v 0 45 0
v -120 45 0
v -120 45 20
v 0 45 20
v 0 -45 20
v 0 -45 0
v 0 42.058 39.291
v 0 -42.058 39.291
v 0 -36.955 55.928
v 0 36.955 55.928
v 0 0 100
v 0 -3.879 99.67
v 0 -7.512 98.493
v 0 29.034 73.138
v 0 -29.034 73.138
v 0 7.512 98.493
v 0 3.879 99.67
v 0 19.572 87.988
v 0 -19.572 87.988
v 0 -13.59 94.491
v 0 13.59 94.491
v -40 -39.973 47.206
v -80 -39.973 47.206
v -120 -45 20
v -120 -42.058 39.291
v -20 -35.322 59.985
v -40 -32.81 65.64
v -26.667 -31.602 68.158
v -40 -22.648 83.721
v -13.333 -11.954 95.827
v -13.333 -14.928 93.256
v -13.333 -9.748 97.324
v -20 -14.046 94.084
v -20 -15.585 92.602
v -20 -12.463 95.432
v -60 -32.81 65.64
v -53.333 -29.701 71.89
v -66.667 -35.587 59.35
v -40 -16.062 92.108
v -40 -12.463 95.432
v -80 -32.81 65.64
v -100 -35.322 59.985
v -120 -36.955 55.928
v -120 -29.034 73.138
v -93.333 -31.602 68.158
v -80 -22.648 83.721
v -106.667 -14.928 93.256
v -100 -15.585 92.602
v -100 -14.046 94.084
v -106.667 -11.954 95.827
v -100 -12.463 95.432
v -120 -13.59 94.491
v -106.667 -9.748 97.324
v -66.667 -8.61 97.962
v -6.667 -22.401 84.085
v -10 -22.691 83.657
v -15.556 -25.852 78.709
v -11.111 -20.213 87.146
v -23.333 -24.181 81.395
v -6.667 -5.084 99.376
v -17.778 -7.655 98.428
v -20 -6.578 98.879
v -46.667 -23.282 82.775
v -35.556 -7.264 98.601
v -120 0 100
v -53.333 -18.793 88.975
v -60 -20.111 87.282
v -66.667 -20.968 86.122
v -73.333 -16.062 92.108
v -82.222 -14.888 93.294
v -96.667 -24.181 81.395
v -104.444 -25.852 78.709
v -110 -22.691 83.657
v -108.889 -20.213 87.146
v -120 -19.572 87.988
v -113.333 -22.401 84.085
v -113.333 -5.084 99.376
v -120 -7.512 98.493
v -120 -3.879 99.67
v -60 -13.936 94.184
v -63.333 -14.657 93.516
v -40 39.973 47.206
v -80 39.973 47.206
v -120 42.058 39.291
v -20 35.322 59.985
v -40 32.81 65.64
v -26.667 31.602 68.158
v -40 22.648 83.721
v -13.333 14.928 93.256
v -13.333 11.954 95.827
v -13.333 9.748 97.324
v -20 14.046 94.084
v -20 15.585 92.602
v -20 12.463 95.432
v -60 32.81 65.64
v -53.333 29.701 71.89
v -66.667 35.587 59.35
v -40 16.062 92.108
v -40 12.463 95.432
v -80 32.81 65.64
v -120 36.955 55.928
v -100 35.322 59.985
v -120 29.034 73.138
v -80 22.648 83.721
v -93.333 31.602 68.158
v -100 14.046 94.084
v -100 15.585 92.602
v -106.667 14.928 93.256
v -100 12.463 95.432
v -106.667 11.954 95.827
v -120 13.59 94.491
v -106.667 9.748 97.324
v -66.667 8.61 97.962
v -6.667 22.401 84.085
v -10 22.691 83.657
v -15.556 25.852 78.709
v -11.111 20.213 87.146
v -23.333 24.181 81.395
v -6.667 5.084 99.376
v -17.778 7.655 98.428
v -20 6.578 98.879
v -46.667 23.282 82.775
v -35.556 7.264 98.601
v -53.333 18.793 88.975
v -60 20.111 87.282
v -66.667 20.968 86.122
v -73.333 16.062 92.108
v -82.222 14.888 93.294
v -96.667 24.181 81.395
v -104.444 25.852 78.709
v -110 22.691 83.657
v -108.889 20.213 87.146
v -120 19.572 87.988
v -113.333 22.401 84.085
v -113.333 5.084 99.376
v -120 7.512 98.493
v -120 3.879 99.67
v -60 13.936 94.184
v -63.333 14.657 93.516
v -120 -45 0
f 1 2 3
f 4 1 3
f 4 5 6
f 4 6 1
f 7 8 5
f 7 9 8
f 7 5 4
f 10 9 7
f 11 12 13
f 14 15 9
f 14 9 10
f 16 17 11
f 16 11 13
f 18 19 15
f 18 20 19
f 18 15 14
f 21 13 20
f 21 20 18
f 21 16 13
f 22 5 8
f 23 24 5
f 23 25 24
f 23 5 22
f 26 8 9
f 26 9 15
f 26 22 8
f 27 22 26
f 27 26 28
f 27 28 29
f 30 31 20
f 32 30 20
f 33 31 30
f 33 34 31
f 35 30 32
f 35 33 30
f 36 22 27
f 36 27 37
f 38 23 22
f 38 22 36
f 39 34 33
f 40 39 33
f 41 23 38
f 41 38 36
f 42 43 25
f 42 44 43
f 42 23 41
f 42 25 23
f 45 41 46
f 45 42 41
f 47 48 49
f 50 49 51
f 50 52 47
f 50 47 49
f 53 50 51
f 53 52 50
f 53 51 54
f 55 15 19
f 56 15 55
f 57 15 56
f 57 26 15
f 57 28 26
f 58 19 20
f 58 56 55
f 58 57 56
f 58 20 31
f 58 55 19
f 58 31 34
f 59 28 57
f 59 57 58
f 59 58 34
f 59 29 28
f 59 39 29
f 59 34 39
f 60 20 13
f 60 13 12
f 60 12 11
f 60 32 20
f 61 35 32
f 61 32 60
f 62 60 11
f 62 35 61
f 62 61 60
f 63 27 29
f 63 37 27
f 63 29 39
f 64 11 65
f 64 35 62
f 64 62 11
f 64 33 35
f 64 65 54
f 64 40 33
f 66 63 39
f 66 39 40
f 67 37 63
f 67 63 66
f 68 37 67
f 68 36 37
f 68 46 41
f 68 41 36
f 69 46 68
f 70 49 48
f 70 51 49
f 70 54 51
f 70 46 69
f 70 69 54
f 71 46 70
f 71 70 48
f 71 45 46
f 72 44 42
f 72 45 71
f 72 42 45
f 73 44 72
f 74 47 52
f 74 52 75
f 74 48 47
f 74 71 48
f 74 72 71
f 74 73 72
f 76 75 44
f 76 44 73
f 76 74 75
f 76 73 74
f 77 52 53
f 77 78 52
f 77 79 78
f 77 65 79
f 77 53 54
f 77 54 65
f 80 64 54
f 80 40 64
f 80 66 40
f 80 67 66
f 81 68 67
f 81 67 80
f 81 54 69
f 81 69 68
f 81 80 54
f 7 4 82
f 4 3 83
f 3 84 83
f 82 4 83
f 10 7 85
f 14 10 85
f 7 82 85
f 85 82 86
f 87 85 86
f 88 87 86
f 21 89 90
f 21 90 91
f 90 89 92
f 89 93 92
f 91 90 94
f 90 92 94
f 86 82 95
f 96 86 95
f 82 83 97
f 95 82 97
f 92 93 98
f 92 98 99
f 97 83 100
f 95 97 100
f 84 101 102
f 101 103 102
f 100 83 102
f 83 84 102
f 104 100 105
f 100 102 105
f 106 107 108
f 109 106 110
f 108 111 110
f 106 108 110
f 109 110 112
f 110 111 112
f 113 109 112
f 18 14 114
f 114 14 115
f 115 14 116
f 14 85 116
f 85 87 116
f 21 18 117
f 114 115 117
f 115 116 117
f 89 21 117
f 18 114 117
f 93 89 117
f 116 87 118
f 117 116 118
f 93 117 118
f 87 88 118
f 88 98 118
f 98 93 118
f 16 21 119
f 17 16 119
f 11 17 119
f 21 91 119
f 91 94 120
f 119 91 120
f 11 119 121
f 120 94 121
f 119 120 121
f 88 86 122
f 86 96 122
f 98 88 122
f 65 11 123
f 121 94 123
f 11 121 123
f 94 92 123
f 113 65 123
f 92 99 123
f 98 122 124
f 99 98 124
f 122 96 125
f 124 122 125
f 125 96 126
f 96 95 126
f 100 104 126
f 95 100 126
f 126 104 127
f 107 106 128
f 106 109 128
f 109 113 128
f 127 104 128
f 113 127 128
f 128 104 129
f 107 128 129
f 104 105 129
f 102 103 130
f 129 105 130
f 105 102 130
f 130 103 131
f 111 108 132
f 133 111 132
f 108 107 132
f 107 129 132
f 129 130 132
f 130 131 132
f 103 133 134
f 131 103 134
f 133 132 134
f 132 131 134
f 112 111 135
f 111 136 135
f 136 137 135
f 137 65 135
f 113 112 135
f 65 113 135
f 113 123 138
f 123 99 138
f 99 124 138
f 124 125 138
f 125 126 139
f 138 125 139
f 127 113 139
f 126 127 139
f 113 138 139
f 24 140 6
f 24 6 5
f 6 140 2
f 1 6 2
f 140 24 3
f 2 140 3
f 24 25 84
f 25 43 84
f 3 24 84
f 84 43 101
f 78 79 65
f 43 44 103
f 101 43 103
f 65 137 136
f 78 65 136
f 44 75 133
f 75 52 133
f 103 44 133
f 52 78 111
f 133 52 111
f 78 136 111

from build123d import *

# Parameters (mm, degrees)
F2_W     = 90
F2_H     = 20
F3_DEPTH = 120


with BuildPart() as f3:
    # F2 (on plane+point) → F3 (new body, through all)
    with BuildSketch(Plane.YZ.offset(-120)):
        with BuildLine():
            Line((-45, 20), (45, 20))
            add(Edge.make_bspline(
                [(45, 20), (43.9216641477, 29.5882127436), (41.6413793137, 47.3415516299), (24.9581268912, 84.1026361306), (9.2870616411, 100.2961582598), (0, 100)],
                knots=[0, 0, 0, 0, 0.3112607769, 0.6874723411, 1, 1, 1, 1], degree=3))
            add(Edge.make_bspline(
                [(-45, 20), (-43.9216641477, 29.5882127436), (-41.6413793137, 47.3415516299), (-24.9581268912, 84.1026361306), (-9.2870616411, 100.2961582598), (0, 100)],
                knots=[0, 0, 0, 0, 0.3112607769, 0.6874723411, 1, 1, 1, 1], degree=3))
        make_face()
        with Locations((0, 10)):
            Rectangle(F2_W, F2_H)
    extrude(amount=F3_DEPTH)


solid = f3.part
